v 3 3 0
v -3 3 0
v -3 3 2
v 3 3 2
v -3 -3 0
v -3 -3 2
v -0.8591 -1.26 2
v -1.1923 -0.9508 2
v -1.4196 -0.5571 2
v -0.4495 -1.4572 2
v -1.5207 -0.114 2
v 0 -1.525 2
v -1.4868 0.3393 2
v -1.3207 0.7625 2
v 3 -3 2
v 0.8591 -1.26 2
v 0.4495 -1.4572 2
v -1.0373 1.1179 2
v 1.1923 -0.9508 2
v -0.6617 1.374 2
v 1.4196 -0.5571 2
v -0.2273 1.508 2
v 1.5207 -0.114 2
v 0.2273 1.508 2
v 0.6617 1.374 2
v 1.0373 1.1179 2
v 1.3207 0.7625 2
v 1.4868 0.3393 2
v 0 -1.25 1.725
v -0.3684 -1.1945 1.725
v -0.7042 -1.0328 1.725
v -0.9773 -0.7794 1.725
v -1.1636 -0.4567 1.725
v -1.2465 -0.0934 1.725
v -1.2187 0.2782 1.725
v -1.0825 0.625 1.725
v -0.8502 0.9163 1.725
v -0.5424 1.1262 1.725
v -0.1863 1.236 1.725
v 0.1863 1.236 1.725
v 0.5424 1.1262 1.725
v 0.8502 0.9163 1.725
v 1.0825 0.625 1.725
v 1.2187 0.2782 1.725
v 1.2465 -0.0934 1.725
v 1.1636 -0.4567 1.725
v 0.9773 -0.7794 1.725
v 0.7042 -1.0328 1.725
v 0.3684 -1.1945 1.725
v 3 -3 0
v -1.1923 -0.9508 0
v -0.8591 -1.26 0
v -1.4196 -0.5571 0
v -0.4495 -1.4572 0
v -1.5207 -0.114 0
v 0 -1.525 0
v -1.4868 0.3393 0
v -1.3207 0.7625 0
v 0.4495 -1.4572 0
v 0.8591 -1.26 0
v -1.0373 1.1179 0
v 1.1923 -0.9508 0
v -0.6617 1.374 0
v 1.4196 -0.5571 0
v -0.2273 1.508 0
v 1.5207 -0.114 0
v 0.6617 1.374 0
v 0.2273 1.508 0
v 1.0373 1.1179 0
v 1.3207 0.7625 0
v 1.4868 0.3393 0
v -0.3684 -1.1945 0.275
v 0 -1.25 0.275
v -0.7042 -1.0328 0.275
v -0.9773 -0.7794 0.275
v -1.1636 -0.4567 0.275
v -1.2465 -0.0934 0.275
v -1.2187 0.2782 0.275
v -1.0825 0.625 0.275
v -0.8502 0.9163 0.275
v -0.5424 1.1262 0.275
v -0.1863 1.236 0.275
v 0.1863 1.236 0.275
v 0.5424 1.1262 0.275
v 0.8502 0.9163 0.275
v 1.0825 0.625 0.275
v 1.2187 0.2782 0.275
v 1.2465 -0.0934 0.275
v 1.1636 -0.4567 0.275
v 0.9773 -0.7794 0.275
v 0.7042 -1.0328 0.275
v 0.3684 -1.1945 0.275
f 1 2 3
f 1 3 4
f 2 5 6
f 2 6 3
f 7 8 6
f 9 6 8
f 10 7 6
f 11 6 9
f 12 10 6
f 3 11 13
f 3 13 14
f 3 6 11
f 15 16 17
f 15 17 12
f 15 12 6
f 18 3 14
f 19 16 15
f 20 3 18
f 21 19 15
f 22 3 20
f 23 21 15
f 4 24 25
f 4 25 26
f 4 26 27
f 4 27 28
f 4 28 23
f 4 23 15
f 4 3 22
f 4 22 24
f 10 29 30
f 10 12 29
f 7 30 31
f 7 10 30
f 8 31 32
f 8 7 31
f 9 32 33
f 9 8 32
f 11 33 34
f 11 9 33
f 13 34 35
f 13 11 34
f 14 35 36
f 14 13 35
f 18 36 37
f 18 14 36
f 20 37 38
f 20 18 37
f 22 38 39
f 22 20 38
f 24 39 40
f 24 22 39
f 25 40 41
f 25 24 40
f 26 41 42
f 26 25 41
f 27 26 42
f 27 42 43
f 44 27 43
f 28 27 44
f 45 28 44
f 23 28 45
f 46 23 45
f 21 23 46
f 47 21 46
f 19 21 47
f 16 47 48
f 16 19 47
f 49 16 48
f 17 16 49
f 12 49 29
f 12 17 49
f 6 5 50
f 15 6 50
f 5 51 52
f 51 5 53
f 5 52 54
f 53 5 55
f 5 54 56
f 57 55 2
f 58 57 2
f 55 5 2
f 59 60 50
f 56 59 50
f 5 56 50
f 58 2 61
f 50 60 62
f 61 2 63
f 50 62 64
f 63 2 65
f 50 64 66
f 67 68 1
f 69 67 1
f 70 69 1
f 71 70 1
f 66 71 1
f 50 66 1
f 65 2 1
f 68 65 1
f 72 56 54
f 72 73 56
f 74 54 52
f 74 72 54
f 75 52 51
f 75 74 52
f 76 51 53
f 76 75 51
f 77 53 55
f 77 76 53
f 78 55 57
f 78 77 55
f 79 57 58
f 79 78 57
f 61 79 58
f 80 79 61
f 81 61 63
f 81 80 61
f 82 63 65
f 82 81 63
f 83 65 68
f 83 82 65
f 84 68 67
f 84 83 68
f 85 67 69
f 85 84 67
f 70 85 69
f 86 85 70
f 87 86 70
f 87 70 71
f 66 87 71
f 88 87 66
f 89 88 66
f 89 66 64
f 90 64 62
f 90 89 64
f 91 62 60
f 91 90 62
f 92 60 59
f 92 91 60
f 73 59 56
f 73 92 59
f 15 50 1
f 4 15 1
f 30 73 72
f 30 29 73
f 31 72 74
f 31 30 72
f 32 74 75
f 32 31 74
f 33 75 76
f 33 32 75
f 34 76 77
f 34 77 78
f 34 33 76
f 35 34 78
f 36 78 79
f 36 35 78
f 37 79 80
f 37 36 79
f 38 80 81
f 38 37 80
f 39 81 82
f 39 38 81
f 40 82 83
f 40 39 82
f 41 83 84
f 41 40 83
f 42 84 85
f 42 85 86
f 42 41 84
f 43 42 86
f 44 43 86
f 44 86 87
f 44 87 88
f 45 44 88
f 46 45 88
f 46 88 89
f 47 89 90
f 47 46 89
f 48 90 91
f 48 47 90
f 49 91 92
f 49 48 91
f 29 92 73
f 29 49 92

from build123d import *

# Parameters (mm, degrees)
SKETCH_1_W      = 6
SKETCH_1_H      = 6
EXTRUDE_1_DEPTH = 2


with BuildPart() as part:
    # 草图1 → 凸台-拉伸1 (new body)
    with BuildSketch(Plane.XY):
        Rectangle(SKETCH_1_W, SKETCH_1_H)
    extrude(amount=EXTRUDE_1_DEPTH)

    # 草图3 → M3 螺纹孔1 (revolve, cut)
    with BuildSketch(Plane(origin=(0, 0, 2), x_dir=(0, -1, 0), z_dir=(1, 0, 0))):
        Polygon((0, 0), (0, 2), (1.525, 2), (1.25, 1.725), (1.25, 0.275), (1.525, 0), align=None)
    revolve(axis=Axis((0, 0, 8.35), (0, 0, -1)), mode=Mode.SUBTRACT)


solid = part.part
